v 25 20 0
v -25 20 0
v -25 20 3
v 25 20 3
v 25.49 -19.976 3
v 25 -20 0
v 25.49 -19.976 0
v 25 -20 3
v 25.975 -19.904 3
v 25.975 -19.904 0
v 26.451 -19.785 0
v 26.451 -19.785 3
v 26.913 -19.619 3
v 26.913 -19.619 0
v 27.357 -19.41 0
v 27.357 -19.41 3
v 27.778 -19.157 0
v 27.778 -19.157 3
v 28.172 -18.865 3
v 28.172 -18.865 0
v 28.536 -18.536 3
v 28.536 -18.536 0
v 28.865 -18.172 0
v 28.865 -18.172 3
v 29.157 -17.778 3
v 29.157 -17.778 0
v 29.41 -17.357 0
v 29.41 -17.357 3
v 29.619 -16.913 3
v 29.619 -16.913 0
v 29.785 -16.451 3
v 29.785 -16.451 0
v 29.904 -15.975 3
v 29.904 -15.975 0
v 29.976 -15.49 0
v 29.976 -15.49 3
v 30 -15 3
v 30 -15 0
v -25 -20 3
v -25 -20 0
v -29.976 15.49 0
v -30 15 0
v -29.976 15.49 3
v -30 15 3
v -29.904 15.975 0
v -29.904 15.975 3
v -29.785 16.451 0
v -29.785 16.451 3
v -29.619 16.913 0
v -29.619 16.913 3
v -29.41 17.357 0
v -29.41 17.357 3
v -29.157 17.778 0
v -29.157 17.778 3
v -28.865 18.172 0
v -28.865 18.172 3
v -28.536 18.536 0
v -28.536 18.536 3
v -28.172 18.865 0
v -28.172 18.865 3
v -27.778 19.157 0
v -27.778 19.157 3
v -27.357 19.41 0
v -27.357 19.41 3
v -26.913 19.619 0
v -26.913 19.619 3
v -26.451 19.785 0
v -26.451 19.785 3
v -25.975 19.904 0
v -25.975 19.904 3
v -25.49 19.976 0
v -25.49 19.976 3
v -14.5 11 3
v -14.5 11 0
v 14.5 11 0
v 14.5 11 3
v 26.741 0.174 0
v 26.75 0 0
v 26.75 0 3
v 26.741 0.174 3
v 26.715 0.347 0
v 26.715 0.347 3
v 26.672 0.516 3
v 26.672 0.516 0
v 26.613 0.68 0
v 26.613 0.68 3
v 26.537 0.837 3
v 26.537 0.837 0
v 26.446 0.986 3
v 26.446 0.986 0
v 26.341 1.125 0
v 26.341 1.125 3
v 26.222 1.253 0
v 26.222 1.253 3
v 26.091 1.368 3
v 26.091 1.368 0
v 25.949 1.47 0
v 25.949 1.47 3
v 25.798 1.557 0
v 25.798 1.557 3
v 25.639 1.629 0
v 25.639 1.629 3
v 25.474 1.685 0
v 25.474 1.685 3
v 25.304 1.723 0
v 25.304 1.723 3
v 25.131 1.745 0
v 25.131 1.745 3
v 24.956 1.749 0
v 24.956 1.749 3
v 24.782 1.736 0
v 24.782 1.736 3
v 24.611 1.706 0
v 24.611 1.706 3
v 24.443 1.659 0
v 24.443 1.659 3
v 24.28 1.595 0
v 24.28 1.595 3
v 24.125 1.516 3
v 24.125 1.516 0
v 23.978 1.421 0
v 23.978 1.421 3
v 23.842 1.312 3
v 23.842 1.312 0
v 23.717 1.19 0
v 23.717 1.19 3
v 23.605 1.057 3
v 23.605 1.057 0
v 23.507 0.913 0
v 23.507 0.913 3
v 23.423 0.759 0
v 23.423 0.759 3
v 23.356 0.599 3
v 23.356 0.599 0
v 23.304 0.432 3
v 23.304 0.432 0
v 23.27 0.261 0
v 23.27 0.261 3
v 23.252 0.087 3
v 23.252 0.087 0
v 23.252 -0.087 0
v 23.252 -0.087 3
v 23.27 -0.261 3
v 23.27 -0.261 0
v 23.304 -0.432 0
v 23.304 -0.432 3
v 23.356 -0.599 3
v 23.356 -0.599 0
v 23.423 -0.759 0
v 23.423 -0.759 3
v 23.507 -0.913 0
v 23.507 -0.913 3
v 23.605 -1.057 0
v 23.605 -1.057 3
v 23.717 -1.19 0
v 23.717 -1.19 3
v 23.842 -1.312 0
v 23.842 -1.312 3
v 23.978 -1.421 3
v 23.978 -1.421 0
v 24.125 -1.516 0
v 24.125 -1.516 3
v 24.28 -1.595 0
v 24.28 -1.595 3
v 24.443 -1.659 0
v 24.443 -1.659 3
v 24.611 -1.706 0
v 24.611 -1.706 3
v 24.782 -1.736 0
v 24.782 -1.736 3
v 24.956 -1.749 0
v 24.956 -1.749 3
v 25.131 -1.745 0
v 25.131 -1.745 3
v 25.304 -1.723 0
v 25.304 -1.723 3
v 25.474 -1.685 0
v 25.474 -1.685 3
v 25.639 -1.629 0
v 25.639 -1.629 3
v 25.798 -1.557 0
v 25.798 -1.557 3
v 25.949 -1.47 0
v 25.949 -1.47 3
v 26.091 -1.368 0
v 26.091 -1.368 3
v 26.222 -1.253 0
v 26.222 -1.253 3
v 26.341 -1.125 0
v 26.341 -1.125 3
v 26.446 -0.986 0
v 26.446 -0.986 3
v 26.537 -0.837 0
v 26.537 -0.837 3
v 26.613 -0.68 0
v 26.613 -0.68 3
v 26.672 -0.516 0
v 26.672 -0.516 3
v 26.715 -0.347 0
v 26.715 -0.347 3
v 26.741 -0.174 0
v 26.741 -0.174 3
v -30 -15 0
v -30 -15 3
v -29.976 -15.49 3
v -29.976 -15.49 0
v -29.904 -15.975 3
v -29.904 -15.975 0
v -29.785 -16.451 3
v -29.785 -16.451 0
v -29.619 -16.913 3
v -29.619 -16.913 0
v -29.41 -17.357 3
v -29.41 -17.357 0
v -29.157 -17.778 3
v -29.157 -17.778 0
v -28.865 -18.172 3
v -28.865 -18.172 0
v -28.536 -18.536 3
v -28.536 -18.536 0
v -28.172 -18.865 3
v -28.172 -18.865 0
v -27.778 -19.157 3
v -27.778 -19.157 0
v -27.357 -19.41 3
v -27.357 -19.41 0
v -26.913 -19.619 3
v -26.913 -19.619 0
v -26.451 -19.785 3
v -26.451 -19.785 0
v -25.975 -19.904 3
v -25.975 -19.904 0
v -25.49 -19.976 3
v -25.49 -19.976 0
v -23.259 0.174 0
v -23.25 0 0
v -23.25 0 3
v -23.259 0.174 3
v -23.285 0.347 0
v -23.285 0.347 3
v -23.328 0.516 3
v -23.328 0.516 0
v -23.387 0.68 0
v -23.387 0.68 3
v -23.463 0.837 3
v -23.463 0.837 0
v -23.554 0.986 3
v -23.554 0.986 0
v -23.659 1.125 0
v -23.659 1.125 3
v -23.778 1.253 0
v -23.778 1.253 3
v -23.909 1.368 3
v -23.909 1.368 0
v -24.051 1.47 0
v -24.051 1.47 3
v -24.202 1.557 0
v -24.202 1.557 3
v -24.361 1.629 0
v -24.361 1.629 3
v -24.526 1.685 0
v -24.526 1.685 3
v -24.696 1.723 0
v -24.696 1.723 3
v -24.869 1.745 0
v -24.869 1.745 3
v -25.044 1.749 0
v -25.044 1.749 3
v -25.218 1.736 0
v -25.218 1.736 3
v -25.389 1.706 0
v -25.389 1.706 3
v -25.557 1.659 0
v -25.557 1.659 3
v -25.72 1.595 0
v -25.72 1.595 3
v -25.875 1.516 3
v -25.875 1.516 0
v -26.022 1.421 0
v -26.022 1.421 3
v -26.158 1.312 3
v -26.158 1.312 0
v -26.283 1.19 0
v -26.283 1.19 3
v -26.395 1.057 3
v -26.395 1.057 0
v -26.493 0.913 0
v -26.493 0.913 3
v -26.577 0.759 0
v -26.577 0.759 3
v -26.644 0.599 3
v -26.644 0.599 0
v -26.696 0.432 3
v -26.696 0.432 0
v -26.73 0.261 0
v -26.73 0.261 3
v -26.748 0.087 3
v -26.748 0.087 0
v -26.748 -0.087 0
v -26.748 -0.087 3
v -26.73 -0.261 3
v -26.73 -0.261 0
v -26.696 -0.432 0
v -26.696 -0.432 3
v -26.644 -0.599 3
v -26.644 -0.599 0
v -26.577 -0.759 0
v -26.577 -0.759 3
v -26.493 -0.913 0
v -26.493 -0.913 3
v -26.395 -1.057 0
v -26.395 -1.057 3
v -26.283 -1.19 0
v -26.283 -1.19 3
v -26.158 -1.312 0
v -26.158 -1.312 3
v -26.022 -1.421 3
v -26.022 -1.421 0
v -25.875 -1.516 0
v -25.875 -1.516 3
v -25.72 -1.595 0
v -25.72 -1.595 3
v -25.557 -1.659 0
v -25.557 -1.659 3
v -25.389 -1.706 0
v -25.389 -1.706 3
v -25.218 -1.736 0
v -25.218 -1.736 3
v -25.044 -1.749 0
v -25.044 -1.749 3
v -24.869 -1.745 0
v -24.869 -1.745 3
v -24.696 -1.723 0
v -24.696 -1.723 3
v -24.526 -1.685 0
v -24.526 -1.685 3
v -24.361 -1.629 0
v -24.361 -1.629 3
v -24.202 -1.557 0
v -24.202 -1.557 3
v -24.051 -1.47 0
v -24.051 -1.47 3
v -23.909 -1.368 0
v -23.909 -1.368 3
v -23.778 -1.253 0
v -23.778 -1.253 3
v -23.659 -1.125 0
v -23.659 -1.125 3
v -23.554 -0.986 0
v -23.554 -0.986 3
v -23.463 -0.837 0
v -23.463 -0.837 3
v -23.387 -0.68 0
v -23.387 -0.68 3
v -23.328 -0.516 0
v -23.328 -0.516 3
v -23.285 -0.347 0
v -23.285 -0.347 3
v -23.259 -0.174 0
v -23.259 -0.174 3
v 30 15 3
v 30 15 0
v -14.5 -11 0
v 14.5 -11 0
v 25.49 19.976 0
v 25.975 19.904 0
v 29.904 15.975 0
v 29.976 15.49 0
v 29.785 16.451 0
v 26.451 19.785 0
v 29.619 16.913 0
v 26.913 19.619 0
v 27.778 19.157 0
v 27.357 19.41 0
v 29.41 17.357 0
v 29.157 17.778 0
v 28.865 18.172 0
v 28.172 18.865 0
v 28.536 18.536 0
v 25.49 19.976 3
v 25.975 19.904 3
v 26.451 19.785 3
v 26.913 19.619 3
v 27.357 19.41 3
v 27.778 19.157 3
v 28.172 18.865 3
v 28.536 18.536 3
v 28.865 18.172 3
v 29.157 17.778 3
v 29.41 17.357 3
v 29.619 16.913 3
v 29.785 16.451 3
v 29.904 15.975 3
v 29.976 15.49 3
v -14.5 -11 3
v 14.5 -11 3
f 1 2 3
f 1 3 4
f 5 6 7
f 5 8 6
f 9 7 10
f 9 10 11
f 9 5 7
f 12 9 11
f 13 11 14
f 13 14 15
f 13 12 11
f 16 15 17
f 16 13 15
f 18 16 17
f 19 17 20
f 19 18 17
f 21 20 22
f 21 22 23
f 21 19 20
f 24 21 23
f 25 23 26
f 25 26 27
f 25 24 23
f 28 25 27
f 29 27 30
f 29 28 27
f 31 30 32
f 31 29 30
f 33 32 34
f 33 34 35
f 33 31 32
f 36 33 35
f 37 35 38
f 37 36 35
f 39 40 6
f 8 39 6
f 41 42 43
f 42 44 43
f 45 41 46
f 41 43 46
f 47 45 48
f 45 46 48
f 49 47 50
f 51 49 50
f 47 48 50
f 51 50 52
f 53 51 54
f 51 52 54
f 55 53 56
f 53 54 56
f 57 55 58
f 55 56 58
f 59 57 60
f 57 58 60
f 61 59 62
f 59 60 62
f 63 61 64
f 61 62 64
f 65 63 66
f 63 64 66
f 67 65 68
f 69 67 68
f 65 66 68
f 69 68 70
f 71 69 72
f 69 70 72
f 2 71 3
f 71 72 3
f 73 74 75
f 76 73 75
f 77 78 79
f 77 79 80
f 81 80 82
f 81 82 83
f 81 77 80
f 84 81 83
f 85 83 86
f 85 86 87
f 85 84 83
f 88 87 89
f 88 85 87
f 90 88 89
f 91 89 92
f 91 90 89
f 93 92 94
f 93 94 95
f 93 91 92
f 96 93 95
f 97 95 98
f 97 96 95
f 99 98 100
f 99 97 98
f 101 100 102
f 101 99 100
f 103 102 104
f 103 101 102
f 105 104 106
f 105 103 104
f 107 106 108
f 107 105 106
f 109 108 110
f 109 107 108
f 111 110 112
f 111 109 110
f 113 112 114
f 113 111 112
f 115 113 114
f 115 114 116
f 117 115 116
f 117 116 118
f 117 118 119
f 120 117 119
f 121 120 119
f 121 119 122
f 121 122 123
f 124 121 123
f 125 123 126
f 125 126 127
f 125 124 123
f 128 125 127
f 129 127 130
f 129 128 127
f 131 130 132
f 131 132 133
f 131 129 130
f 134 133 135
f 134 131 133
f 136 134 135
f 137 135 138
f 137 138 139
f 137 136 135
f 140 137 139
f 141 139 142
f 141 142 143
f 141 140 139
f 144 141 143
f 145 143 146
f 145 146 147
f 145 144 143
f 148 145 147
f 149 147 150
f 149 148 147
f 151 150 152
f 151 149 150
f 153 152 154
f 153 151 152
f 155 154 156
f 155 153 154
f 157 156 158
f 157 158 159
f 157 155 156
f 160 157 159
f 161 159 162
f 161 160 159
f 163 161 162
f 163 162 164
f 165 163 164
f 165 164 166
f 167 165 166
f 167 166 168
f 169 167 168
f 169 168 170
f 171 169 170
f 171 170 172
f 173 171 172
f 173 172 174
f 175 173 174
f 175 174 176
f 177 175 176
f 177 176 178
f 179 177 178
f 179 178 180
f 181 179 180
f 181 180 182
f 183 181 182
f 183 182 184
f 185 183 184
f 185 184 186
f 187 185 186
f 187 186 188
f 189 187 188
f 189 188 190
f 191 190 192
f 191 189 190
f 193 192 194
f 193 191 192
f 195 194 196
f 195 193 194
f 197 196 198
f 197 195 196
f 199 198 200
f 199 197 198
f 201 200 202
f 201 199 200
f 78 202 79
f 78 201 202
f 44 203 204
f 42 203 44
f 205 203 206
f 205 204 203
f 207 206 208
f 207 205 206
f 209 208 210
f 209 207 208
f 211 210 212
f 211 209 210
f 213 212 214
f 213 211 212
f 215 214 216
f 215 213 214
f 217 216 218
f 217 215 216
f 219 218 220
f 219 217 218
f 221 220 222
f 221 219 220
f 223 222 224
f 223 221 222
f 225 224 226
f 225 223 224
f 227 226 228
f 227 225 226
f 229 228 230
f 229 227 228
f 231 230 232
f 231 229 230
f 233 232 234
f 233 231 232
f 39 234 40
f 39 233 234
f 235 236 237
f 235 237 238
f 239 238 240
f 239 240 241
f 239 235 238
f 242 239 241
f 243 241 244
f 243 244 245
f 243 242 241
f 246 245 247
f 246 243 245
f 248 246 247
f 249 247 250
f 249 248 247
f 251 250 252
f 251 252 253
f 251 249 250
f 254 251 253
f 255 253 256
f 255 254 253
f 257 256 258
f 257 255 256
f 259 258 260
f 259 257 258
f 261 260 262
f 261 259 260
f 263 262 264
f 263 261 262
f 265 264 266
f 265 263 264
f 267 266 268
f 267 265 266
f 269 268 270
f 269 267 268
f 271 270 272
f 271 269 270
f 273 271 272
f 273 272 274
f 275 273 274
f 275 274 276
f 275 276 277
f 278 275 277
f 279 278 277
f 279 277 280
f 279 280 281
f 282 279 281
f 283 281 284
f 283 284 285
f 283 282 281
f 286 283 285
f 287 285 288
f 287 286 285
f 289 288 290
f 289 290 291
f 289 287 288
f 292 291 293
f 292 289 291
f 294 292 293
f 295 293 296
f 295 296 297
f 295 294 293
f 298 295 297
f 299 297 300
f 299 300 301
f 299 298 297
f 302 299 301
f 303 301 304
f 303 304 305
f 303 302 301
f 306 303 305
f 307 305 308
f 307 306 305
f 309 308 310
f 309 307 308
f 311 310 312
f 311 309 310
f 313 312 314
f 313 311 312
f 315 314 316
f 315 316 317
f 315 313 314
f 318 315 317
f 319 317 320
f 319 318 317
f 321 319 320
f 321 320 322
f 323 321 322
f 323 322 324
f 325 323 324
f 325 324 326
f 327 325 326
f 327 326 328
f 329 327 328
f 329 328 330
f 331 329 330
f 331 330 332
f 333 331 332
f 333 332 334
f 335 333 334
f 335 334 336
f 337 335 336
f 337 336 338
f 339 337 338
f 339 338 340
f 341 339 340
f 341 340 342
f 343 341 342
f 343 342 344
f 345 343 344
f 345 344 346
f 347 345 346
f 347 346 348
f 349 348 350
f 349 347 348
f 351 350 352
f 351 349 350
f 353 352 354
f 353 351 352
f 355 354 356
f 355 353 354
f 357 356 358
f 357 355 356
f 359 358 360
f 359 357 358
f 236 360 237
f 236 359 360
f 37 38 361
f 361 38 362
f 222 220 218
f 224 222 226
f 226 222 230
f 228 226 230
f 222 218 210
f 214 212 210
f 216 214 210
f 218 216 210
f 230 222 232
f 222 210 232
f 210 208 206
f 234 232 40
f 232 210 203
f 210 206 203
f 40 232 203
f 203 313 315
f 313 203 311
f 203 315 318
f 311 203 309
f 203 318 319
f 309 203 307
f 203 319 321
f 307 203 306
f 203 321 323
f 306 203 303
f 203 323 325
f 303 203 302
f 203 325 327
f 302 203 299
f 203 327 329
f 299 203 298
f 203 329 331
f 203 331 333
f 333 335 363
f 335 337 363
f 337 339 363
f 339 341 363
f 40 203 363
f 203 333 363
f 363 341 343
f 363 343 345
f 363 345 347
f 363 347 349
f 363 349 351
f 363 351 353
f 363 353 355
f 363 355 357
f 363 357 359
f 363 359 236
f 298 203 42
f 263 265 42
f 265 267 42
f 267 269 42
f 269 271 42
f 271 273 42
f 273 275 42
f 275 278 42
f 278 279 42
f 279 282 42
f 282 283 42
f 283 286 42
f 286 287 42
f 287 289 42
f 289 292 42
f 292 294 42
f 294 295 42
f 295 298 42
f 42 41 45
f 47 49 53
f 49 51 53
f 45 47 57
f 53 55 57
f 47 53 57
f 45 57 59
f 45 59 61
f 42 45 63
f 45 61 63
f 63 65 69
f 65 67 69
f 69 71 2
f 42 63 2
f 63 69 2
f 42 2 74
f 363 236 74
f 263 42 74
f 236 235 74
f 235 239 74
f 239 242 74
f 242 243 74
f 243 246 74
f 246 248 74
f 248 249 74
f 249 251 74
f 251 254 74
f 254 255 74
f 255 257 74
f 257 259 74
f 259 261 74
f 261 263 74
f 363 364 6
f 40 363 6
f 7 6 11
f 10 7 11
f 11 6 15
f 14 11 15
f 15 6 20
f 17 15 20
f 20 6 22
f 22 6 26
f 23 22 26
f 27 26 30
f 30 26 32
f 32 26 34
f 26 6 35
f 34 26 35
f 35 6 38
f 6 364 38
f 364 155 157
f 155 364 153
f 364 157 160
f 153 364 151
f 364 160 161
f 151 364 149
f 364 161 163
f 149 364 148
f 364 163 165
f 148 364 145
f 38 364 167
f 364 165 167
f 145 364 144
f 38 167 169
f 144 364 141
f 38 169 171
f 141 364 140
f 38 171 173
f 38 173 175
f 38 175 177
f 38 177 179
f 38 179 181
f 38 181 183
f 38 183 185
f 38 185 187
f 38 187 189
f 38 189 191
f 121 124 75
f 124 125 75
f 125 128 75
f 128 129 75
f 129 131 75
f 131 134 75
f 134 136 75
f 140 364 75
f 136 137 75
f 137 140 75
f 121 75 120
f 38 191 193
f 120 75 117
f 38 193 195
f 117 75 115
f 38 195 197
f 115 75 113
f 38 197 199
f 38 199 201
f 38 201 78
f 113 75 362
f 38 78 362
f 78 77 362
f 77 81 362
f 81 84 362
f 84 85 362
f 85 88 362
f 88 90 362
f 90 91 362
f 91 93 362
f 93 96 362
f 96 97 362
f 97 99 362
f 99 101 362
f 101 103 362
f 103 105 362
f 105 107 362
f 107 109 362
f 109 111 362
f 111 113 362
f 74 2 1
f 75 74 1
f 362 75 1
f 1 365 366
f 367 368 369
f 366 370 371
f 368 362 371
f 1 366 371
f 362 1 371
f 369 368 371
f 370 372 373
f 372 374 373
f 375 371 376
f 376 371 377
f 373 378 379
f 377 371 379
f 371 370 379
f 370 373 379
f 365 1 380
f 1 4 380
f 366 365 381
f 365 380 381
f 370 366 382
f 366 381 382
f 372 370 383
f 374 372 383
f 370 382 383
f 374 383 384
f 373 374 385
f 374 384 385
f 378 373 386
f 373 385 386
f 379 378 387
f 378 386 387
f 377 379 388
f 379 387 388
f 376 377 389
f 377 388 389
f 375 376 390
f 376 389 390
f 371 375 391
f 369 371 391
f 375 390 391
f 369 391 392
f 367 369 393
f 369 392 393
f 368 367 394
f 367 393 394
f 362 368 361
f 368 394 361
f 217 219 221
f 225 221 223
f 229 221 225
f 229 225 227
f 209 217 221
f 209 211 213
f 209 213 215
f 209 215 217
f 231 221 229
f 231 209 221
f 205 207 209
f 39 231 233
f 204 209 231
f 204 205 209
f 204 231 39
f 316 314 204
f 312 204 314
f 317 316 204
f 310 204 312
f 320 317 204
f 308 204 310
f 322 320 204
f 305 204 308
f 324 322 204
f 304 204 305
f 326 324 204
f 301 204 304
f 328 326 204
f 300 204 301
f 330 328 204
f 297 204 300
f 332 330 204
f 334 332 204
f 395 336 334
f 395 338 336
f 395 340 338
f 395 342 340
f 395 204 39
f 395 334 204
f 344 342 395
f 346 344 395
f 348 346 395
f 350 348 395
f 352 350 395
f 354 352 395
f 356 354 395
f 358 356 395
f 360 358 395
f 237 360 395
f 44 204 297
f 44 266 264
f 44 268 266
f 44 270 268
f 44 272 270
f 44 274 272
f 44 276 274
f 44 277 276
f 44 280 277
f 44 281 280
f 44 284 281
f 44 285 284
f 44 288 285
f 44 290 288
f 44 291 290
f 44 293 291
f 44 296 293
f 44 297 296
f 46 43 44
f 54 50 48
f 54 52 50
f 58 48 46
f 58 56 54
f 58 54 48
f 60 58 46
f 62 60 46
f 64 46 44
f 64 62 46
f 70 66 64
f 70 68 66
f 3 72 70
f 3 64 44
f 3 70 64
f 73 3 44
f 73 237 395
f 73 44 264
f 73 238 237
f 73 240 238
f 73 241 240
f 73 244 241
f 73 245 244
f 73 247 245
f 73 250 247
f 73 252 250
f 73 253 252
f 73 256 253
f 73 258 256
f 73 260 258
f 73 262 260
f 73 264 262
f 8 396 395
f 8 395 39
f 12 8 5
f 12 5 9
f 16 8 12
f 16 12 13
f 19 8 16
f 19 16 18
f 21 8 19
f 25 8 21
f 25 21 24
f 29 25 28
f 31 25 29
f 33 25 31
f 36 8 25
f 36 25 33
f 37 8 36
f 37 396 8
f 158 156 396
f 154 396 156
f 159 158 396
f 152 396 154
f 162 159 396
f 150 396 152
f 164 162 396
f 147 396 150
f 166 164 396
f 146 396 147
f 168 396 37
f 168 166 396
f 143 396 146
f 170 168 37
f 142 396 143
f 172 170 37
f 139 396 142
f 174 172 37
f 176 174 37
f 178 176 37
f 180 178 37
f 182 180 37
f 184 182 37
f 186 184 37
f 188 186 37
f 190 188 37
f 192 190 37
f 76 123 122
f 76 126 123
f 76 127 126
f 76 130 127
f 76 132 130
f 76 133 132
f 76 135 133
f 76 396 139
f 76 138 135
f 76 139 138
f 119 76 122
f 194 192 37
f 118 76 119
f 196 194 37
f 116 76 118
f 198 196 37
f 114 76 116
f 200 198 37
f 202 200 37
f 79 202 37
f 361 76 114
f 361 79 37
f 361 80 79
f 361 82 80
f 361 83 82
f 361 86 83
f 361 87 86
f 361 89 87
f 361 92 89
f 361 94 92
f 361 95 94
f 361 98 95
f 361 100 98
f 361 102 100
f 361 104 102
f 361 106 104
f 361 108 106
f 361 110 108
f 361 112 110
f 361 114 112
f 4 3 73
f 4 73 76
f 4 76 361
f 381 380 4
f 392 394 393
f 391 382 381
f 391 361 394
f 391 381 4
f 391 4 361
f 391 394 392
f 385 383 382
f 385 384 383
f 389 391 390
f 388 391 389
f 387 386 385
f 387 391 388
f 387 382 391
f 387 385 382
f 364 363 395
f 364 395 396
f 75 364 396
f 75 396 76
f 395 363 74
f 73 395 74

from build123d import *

# Parameters (mm, degrees)
F0_W     = 60
F0_H     = 40
F0_R     = 1.75
F0_W_2   = 29
F0_H_2   = 22
F1_DEPTH = 3
F2_R     = 5


with BuildPart() as f1:
    # F0 (on Top) → F1 (new body)
    with BuildSketch(Plane.XY):
        Rectangle(F0_W, F0_H)
        with Locations((-25, 0)):
            Circle(F0_R, mode=Mode.SUBTRACT)
        Rectangle(F0_W_2, F0_H_2, mode=Mode.SUBTRACT)
        with Locations((25, 0)):
            Circle(F0_R, mode=Mode.SUBTRACT)
    extrude(amount=F1_DEPTH)

    # F2
    f2_edges = [f1.edges().sort_by_distance(p)[0] for p in [
        (-30, -20, 1.5),
        (-30, 20, 1.5),
        (30, 20, 1.5),
        (30, -20, 1.5),
    ]]
    fillet(f2_edges, radius=F2_R)


solid = f1.part
